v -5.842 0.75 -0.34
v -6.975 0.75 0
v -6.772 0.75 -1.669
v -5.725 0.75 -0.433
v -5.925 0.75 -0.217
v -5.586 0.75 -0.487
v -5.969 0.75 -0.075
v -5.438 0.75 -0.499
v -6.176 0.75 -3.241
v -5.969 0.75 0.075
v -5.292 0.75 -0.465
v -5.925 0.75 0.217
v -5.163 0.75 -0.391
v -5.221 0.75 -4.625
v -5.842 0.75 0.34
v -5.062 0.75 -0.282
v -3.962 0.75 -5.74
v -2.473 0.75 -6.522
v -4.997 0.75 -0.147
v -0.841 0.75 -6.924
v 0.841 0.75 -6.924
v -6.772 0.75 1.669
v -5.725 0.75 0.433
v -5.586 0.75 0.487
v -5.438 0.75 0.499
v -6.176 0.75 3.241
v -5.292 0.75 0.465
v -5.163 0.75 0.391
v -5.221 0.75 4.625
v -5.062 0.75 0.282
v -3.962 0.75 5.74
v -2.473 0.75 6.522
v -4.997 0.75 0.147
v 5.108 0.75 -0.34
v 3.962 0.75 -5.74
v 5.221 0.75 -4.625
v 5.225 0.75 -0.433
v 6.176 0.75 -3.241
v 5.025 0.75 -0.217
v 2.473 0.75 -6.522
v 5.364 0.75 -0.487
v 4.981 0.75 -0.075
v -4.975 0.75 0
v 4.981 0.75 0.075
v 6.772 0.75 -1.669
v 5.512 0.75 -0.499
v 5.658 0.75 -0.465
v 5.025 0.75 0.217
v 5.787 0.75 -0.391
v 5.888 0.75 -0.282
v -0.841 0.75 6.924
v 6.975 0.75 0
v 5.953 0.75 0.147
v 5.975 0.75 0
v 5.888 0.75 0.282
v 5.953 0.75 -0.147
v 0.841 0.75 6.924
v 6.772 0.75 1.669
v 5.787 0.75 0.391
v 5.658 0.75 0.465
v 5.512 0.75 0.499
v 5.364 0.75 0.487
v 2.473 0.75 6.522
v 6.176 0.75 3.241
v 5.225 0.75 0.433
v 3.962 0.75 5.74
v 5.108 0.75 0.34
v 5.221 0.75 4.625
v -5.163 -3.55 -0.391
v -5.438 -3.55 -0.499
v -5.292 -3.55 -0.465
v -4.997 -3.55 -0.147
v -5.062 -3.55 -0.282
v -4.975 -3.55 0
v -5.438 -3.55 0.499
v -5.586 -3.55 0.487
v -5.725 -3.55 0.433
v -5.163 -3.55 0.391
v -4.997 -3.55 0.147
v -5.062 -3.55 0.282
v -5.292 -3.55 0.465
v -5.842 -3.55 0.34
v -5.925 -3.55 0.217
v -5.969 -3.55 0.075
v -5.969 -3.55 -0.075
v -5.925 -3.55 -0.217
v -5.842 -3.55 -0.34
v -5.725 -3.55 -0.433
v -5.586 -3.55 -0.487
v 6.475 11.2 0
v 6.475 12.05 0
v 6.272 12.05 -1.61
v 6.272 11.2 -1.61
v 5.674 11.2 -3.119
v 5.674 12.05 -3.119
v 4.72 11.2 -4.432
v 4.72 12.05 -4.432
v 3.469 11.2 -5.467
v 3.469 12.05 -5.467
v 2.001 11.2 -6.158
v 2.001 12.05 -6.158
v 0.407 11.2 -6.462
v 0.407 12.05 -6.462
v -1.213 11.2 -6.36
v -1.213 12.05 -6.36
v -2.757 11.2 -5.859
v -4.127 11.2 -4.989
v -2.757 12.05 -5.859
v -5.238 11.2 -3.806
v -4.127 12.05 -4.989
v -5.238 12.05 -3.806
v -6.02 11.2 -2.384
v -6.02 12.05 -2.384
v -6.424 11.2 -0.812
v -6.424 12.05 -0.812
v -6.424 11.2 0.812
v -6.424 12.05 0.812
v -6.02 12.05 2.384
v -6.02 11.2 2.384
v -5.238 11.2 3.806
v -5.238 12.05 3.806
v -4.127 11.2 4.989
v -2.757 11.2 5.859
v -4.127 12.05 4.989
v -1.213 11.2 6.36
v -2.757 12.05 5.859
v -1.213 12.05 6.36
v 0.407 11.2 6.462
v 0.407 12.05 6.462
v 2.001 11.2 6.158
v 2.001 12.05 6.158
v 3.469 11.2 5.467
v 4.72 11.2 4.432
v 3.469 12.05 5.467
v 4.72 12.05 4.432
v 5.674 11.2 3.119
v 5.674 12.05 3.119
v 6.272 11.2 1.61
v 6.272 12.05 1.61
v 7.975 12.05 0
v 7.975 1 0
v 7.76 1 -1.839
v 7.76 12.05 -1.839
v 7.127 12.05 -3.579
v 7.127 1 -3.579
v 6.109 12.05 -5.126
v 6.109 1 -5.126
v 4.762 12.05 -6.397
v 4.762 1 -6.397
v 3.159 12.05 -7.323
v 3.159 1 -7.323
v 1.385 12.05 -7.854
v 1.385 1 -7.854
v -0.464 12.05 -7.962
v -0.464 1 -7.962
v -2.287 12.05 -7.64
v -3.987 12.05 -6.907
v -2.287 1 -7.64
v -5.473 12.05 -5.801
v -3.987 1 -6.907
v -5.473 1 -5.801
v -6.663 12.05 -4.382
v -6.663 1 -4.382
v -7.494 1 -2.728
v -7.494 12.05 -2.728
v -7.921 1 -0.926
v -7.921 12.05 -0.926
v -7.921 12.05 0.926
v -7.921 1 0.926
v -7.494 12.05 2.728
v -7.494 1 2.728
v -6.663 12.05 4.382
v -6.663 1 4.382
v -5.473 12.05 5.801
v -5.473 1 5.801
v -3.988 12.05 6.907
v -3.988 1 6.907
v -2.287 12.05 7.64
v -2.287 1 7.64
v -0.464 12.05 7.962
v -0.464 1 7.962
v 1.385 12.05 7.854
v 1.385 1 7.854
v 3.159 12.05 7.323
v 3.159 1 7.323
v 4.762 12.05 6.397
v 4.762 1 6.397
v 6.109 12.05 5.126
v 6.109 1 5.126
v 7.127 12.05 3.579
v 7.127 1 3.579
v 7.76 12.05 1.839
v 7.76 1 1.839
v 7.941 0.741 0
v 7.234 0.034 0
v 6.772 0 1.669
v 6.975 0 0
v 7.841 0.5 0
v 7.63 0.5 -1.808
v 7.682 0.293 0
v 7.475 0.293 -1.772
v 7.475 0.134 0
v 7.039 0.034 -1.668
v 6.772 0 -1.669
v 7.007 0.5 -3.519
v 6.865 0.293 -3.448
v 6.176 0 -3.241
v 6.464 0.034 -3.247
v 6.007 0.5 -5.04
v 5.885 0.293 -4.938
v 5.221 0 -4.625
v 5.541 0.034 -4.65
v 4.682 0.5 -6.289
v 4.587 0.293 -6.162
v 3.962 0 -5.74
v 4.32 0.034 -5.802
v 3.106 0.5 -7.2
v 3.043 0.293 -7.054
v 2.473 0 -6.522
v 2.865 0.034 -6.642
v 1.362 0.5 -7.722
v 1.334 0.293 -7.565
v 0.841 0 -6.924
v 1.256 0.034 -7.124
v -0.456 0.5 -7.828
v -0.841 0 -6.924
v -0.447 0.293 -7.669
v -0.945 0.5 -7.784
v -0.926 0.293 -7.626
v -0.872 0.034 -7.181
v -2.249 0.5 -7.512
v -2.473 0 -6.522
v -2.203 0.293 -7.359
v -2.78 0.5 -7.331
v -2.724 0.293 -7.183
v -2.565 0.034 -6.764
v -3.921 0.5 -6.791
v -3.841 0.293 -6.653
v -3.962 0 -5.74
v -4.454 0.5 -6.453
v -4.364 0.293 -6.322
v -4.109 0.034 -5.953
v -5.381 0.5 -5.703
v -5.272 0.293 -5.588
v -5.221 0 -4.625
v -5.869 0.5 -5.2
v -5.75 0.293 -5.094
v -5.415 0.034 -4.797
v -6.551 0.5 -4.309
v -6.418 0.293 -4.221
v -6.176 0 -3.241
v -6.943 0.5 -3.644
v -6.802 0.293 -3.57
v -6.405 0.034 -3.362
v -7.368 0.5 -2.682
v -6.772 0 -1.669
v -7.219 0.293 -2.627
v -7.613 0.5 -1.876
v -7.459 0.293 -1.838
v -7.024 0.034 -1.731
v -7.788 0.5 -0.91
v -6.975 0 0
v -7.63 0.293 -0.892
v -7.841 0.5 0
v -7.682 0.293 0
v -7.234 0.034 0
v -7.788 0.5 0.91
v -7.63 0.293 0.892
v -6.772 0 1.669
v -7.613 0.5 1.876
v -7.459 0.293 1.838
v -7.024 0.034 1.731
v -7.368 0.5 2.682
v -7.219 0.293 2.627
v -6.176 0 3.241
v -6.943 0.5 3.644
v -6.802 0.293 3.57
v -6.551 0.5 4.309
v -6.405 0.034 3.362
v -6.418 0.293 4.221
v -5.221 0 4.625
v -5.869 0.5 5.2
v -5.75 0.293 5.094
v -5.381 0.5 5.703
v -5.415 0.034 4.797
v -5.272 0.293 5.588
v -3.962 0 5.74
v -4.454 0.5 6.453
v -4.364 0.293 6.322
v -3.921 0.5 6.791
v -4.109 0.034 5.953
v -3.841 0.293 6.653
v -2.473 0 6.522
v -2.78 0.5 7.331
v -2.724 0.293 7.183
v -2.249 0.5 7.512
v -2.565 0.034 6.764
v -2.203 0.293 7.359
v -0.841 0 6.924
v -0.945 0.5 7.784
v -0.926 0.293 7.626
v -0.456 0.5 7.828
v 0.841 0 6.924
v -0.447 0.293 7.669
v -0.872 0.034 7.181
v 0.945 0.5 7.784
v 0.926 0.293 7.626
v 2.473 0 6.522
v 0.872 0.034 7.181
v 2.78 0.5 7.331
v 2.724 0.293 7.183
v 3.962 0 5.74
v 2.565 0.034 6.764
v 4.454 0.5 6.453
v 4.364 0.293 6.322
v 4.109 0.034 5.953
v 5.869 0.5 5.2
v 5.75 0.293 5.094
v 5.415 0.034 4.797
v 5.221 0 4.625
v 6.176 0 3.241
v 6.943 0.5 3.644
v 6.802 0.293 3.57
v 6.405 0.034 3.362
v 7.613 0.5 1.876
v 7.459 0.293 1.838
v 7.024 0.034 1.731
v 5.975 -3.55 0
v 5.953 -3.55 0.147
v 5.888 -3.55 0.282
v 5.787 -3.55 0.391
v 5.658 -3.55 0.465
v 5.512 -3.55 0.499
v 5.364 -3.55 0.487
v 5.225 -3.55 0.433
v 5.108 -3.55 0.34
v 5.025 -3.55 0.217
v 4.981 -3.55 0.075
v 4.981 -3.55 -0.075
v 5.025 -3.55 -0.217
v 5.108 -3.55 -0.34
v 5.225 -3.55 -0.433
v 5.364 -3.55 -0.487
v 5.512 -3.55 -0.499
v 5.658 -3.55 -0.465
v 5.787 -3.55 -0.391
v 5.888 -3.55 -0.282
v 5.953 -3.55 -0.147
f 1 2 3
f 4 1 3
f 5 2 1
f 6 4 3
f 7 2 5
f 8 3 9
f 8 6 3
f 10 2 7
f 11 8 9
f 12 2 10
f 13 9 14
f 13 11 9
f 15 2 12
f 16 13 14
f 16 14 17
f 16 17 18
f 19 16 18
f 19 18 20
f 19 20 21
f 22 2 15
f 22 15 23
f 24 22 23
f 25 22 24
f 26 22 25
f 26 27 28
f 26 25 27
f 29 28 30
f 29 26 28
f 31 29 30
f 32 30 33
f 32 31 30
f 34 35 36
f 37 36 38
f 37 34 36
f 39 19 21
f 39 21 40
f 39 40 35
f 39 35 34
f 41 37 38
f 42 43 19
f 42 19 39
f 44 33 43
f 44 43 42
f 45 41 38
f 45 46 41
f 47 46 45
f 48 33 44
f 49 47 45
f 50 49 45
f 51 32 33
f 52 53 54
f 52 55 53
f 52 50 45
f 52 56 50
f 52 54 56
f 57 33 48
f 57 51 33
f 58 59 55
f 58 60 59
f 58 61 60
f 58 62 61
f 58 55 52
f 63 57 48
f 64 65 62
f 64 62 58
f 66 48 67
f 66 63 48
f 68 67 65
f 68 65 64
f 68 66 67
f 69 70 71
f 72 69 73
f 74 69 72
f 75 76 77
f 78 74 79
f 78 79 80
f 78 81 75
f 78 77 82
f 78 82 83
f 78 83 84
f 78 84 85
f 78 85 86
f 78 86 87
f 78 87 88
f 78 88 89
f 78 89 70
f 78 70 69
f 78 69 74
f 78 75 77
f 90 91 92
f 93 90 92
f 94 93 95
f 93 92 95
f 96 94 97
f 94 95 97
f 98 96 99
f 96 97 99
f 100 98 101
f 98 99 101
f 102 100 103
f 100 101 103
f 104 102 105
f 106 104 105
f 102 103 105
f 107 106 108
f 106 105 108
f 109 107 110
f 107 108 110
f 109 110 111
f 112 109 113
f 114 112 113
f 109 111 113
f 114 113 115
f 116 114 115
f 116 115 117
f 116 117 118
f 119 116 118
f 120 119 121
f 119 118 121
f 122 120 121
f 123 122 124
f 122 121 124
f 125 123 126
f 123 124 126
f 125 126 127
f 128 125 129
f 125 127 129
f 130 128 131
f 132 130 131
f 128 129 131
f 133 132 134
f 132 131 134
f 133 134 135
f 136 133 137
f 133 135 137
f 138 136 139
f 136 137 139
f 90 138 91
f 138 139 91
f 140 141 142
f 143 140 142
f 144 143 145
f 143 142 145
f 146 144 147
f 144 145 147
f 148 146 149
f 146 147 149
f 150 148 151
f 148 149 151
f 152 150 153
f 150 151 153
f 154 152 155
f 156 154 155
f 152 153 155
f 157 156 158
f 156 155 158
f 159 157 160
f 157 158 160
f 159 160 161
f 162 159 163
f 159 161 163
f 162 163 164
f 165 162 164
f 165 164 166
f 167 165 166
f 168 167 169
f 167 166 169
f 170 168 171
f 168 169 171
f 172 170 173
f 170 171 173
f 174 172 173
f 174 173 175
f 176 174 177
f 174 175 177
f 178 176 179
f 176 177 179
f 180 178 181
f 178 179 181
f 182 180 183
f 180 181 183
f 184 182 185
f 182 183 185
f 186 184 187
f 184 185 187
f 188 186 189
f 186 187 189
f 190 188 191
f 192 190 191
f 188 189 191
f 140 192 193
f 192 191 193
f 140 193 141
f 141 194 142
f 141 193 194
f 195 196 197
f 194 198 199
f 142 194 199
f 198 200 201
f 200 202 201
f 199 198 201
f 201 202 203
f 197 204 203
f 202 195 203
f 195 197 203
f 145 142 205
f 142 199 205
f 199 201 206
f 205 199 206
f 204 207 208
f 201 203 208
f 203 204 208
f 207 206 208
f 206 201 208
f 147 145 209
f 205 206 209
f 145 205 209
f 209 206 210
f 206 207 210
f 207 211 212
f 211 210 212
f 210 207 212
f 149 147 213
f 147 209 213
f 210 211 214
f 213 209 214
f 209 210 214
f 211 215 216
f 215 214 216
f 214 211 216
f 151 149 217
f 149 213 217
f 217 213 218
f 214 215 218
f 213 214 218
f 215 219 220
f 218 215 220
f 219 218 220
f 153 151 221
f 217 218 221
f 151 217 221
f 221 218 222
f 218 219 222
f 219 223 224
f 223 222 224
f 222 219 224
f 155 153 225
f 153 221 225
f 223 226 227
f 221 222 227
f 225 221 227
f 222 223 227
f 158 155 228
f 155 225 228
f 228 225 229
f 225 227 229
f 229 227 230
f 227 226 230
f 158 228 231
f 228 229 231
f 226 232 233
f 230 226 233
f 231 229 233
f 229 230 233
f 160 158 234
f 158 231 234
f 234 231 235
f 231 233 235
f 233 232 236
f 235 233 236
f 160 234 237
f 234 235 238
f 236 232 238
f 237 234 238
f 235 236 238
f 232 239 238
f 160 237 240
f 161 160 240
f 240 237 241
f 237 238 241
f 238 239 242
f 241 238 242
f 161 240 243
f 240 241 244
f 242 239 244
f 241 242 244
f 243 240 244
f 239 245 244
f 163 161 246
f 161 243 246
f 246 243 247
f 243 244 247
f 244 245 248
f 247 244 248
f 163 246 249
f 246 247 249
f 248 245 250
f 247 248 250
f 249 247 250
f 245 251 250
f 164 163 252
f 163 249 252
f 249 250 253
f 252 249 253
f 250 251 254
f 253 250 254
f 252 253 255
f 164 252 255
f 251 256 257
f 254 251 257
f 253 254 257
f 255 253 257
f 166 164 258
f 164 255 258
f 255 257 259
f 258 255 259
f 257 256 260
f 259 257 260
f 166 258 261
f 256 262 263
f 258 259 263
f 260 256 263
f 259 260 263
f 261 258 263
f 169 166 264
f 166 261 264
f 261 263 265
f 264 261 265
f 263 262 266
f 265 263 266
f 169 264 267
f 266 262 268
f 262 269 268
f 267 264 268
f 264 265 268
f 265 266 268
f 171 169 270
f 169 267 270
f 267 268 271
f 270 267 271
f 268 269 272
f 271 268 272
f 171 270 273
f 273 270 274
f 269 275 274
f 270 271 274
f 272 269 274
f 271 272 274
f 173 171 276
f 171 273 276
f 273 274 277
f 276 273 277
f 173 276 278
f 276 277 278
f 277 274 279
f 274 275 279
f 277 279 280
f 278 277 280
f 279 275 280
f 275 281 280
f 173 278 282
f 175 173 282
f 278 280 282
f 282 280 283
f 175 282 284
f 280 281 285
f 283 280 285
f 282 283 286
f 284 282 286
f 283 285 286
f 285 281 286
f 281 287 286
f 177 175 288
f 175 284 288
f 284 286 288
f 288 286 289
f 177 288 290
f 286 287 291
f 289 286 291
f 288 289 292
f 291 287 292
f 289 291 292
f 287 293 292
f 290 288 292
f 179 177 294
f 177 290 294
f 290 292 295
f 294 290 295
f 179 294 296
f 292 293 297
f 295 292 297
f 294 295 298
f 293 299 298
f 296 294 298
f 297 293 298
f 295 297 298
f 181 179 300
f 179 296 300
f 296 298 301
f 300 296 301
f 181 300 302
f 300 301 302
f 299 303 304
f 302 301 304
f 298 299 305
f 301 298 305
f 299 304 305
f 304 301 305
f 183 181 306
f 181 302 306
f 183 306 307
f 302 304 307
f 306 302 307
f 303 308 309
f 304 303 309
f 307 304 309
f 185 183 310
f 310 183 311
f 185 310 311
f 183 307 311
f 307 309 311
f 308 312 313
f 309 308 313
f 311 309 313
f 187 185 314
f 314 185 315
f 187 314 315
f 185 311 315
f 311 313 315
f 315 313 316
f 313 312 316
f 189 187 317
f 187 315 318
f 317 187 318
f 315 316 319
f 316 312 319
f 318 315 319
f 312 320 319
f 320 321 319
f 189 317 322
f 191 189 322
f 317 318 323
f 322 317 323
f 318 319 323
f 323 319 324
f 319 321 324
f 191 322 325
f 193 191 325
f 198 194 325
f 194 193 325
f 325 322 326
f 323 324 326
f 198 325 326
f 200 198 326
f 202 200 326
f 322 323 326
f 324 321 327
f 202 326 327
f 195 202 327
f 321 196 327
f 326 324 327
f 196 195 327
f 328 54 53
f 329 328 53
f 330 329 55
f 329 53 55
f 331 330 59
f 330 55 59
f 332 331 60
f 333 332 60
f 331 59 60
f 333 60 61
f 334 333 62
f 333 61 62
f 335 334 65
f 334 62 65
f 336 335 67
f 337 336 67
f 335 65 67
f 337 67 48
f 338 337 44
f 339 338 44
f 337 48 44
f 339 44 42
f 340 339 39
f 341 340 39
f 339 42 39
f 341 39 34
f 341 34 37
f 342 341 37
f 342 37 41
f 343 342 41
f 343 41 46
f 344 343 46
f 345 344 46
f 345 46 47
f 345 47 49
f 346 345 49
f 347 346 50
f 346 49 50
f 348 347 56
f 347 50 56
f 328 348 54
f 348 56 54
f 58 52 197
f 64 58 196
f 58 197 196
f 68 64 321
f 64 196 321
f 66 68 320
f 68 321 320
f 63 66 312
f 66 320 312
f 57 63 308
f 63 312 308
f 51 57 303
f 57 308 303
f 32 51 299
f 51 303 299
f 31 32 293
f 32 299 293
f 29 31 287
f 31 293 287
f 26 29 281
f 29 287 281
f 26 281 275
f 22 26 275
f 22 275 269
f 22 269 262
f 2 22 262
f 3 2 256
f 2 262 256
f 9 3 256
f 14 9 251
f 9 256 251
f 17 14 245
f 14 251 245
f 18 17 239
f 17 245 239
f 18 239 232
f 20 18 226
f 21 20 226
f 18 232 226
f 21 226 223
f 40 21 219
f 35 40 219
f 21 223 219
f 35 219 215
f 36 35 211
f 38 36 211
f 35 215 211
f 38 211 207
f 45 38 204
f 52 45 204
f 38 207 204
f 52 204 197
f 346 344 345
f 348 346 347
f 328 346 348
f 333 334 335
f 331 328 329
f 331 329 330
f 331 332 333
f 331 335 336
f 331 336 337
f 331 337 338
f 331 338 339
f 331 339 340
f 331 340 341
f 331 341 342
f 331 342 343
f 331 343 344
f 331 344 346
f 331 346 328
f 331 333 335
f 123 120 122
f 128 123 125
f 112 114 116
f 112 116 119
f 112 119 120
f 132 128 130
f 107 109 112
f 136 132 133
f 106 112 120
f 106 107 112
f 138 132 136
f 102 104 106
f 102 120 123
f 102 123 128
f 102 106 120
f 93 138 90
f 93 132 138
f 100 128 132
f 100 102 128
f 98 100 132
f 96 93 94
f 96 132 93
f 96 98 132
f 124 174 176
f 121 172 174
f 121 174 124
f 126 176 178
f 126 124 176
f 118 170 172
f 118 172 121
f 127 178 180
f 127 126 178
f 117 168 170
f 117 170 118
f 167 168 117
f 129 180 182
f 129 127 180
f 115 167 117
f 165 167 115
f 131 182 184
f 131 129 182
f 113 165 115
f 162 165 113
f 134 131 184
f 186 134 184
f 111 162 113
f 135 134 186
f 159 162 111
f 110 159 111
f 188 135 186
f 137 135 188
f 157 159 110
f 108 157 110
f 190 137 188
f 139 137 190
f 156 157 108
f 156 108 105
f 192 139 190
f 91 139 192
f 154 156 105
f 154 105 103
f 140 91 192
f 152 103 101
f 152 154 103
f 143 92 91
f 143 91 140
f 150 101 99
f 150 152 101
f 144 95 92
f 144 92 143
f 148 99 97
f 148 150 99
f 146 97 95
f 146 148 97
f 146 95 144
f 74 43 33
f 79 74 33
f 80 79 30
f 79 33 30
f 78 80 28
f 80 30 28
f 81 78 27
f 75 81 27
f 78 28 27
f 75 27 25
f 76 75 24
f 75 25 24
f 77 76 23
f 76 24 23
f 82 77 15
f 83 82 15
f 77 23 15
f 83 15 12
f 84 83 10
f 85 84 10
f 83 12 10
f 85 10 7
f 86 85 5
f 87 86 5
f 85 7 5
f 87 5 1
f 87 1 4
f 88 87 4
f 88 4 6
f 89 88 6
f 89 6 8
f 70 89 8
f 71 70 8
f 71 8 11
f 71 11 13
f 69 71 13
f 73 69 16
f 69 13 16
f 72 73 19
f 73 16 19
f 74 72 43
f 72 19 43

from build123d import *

# Parameters (mm, degrees)
SKETCH1_R           = 7.975
BOSS_EXTRUDE1_DEPTH = 12.05
FILLET1_R           = 1
SKETCH3_R           = 6.975
CUT_EXTRUDE1_DEPTH  = 0.75
SKETCH4_R           = 0.5
BOSS_EXTRUDE2_DEPTH = 4.3
SKETCH5_R           = 6.475
CUT_EXTRUDE2_DEPTH  = 0.85


with BuildPart() as part:
    # Sketch1 → Boss-Extrude1 (new body)
    with BuildSketch(Plane(origin=(0, 0, 0), x_dir=(1, 0, 0), z_dir=(0, 1, 0))):
        Circle(SKETCH1_R)
    extrude(amount=BOSS_EXTRUDE1_DEPTH)

    # Fillet1
    fillet1_edges = [part.edges().sort_by_distance(p)[0] for p in [
        (-7.975, 0, 0),
    ]]
    fillet(fillet1_edges, radius=FILLET1_R)

    # Sketch3 → Cut-Extrude1 (cut)
    with BuildSketch(Plane.XZ):
        Circle(SKETCH3_R)
    extrude(amount=-CUT_EXTRUDE1_DEPTH, mode=Mode.SUBTRACT)

    # Sketch4 → Boss-Extrude2 (add)
    with BuildSketch(Plane.XZ.offset(-0.75)):
        with Locations((-5.475, 0)):
            Circle(SKETCH4_R)
        with Locations((5.475, 0)):
            Circle(SKETCH4_R)
    extrude(amount=BOSS_EXTRUDE2_DEPTH)

    # Sketch5 → Cut-Extrude2 (cut)
    with BuildSketch(Plane(origin=(0, 12.05, 0), x_dir=(1, 0, 0), z_dir=(0, 1, 0))):
        Circle(SKETCH5_R)
    extrude(amount=-CUT_EXTRUDE2_DEPTH, mode=Mode.SUBTRACT)


solid = part.part
